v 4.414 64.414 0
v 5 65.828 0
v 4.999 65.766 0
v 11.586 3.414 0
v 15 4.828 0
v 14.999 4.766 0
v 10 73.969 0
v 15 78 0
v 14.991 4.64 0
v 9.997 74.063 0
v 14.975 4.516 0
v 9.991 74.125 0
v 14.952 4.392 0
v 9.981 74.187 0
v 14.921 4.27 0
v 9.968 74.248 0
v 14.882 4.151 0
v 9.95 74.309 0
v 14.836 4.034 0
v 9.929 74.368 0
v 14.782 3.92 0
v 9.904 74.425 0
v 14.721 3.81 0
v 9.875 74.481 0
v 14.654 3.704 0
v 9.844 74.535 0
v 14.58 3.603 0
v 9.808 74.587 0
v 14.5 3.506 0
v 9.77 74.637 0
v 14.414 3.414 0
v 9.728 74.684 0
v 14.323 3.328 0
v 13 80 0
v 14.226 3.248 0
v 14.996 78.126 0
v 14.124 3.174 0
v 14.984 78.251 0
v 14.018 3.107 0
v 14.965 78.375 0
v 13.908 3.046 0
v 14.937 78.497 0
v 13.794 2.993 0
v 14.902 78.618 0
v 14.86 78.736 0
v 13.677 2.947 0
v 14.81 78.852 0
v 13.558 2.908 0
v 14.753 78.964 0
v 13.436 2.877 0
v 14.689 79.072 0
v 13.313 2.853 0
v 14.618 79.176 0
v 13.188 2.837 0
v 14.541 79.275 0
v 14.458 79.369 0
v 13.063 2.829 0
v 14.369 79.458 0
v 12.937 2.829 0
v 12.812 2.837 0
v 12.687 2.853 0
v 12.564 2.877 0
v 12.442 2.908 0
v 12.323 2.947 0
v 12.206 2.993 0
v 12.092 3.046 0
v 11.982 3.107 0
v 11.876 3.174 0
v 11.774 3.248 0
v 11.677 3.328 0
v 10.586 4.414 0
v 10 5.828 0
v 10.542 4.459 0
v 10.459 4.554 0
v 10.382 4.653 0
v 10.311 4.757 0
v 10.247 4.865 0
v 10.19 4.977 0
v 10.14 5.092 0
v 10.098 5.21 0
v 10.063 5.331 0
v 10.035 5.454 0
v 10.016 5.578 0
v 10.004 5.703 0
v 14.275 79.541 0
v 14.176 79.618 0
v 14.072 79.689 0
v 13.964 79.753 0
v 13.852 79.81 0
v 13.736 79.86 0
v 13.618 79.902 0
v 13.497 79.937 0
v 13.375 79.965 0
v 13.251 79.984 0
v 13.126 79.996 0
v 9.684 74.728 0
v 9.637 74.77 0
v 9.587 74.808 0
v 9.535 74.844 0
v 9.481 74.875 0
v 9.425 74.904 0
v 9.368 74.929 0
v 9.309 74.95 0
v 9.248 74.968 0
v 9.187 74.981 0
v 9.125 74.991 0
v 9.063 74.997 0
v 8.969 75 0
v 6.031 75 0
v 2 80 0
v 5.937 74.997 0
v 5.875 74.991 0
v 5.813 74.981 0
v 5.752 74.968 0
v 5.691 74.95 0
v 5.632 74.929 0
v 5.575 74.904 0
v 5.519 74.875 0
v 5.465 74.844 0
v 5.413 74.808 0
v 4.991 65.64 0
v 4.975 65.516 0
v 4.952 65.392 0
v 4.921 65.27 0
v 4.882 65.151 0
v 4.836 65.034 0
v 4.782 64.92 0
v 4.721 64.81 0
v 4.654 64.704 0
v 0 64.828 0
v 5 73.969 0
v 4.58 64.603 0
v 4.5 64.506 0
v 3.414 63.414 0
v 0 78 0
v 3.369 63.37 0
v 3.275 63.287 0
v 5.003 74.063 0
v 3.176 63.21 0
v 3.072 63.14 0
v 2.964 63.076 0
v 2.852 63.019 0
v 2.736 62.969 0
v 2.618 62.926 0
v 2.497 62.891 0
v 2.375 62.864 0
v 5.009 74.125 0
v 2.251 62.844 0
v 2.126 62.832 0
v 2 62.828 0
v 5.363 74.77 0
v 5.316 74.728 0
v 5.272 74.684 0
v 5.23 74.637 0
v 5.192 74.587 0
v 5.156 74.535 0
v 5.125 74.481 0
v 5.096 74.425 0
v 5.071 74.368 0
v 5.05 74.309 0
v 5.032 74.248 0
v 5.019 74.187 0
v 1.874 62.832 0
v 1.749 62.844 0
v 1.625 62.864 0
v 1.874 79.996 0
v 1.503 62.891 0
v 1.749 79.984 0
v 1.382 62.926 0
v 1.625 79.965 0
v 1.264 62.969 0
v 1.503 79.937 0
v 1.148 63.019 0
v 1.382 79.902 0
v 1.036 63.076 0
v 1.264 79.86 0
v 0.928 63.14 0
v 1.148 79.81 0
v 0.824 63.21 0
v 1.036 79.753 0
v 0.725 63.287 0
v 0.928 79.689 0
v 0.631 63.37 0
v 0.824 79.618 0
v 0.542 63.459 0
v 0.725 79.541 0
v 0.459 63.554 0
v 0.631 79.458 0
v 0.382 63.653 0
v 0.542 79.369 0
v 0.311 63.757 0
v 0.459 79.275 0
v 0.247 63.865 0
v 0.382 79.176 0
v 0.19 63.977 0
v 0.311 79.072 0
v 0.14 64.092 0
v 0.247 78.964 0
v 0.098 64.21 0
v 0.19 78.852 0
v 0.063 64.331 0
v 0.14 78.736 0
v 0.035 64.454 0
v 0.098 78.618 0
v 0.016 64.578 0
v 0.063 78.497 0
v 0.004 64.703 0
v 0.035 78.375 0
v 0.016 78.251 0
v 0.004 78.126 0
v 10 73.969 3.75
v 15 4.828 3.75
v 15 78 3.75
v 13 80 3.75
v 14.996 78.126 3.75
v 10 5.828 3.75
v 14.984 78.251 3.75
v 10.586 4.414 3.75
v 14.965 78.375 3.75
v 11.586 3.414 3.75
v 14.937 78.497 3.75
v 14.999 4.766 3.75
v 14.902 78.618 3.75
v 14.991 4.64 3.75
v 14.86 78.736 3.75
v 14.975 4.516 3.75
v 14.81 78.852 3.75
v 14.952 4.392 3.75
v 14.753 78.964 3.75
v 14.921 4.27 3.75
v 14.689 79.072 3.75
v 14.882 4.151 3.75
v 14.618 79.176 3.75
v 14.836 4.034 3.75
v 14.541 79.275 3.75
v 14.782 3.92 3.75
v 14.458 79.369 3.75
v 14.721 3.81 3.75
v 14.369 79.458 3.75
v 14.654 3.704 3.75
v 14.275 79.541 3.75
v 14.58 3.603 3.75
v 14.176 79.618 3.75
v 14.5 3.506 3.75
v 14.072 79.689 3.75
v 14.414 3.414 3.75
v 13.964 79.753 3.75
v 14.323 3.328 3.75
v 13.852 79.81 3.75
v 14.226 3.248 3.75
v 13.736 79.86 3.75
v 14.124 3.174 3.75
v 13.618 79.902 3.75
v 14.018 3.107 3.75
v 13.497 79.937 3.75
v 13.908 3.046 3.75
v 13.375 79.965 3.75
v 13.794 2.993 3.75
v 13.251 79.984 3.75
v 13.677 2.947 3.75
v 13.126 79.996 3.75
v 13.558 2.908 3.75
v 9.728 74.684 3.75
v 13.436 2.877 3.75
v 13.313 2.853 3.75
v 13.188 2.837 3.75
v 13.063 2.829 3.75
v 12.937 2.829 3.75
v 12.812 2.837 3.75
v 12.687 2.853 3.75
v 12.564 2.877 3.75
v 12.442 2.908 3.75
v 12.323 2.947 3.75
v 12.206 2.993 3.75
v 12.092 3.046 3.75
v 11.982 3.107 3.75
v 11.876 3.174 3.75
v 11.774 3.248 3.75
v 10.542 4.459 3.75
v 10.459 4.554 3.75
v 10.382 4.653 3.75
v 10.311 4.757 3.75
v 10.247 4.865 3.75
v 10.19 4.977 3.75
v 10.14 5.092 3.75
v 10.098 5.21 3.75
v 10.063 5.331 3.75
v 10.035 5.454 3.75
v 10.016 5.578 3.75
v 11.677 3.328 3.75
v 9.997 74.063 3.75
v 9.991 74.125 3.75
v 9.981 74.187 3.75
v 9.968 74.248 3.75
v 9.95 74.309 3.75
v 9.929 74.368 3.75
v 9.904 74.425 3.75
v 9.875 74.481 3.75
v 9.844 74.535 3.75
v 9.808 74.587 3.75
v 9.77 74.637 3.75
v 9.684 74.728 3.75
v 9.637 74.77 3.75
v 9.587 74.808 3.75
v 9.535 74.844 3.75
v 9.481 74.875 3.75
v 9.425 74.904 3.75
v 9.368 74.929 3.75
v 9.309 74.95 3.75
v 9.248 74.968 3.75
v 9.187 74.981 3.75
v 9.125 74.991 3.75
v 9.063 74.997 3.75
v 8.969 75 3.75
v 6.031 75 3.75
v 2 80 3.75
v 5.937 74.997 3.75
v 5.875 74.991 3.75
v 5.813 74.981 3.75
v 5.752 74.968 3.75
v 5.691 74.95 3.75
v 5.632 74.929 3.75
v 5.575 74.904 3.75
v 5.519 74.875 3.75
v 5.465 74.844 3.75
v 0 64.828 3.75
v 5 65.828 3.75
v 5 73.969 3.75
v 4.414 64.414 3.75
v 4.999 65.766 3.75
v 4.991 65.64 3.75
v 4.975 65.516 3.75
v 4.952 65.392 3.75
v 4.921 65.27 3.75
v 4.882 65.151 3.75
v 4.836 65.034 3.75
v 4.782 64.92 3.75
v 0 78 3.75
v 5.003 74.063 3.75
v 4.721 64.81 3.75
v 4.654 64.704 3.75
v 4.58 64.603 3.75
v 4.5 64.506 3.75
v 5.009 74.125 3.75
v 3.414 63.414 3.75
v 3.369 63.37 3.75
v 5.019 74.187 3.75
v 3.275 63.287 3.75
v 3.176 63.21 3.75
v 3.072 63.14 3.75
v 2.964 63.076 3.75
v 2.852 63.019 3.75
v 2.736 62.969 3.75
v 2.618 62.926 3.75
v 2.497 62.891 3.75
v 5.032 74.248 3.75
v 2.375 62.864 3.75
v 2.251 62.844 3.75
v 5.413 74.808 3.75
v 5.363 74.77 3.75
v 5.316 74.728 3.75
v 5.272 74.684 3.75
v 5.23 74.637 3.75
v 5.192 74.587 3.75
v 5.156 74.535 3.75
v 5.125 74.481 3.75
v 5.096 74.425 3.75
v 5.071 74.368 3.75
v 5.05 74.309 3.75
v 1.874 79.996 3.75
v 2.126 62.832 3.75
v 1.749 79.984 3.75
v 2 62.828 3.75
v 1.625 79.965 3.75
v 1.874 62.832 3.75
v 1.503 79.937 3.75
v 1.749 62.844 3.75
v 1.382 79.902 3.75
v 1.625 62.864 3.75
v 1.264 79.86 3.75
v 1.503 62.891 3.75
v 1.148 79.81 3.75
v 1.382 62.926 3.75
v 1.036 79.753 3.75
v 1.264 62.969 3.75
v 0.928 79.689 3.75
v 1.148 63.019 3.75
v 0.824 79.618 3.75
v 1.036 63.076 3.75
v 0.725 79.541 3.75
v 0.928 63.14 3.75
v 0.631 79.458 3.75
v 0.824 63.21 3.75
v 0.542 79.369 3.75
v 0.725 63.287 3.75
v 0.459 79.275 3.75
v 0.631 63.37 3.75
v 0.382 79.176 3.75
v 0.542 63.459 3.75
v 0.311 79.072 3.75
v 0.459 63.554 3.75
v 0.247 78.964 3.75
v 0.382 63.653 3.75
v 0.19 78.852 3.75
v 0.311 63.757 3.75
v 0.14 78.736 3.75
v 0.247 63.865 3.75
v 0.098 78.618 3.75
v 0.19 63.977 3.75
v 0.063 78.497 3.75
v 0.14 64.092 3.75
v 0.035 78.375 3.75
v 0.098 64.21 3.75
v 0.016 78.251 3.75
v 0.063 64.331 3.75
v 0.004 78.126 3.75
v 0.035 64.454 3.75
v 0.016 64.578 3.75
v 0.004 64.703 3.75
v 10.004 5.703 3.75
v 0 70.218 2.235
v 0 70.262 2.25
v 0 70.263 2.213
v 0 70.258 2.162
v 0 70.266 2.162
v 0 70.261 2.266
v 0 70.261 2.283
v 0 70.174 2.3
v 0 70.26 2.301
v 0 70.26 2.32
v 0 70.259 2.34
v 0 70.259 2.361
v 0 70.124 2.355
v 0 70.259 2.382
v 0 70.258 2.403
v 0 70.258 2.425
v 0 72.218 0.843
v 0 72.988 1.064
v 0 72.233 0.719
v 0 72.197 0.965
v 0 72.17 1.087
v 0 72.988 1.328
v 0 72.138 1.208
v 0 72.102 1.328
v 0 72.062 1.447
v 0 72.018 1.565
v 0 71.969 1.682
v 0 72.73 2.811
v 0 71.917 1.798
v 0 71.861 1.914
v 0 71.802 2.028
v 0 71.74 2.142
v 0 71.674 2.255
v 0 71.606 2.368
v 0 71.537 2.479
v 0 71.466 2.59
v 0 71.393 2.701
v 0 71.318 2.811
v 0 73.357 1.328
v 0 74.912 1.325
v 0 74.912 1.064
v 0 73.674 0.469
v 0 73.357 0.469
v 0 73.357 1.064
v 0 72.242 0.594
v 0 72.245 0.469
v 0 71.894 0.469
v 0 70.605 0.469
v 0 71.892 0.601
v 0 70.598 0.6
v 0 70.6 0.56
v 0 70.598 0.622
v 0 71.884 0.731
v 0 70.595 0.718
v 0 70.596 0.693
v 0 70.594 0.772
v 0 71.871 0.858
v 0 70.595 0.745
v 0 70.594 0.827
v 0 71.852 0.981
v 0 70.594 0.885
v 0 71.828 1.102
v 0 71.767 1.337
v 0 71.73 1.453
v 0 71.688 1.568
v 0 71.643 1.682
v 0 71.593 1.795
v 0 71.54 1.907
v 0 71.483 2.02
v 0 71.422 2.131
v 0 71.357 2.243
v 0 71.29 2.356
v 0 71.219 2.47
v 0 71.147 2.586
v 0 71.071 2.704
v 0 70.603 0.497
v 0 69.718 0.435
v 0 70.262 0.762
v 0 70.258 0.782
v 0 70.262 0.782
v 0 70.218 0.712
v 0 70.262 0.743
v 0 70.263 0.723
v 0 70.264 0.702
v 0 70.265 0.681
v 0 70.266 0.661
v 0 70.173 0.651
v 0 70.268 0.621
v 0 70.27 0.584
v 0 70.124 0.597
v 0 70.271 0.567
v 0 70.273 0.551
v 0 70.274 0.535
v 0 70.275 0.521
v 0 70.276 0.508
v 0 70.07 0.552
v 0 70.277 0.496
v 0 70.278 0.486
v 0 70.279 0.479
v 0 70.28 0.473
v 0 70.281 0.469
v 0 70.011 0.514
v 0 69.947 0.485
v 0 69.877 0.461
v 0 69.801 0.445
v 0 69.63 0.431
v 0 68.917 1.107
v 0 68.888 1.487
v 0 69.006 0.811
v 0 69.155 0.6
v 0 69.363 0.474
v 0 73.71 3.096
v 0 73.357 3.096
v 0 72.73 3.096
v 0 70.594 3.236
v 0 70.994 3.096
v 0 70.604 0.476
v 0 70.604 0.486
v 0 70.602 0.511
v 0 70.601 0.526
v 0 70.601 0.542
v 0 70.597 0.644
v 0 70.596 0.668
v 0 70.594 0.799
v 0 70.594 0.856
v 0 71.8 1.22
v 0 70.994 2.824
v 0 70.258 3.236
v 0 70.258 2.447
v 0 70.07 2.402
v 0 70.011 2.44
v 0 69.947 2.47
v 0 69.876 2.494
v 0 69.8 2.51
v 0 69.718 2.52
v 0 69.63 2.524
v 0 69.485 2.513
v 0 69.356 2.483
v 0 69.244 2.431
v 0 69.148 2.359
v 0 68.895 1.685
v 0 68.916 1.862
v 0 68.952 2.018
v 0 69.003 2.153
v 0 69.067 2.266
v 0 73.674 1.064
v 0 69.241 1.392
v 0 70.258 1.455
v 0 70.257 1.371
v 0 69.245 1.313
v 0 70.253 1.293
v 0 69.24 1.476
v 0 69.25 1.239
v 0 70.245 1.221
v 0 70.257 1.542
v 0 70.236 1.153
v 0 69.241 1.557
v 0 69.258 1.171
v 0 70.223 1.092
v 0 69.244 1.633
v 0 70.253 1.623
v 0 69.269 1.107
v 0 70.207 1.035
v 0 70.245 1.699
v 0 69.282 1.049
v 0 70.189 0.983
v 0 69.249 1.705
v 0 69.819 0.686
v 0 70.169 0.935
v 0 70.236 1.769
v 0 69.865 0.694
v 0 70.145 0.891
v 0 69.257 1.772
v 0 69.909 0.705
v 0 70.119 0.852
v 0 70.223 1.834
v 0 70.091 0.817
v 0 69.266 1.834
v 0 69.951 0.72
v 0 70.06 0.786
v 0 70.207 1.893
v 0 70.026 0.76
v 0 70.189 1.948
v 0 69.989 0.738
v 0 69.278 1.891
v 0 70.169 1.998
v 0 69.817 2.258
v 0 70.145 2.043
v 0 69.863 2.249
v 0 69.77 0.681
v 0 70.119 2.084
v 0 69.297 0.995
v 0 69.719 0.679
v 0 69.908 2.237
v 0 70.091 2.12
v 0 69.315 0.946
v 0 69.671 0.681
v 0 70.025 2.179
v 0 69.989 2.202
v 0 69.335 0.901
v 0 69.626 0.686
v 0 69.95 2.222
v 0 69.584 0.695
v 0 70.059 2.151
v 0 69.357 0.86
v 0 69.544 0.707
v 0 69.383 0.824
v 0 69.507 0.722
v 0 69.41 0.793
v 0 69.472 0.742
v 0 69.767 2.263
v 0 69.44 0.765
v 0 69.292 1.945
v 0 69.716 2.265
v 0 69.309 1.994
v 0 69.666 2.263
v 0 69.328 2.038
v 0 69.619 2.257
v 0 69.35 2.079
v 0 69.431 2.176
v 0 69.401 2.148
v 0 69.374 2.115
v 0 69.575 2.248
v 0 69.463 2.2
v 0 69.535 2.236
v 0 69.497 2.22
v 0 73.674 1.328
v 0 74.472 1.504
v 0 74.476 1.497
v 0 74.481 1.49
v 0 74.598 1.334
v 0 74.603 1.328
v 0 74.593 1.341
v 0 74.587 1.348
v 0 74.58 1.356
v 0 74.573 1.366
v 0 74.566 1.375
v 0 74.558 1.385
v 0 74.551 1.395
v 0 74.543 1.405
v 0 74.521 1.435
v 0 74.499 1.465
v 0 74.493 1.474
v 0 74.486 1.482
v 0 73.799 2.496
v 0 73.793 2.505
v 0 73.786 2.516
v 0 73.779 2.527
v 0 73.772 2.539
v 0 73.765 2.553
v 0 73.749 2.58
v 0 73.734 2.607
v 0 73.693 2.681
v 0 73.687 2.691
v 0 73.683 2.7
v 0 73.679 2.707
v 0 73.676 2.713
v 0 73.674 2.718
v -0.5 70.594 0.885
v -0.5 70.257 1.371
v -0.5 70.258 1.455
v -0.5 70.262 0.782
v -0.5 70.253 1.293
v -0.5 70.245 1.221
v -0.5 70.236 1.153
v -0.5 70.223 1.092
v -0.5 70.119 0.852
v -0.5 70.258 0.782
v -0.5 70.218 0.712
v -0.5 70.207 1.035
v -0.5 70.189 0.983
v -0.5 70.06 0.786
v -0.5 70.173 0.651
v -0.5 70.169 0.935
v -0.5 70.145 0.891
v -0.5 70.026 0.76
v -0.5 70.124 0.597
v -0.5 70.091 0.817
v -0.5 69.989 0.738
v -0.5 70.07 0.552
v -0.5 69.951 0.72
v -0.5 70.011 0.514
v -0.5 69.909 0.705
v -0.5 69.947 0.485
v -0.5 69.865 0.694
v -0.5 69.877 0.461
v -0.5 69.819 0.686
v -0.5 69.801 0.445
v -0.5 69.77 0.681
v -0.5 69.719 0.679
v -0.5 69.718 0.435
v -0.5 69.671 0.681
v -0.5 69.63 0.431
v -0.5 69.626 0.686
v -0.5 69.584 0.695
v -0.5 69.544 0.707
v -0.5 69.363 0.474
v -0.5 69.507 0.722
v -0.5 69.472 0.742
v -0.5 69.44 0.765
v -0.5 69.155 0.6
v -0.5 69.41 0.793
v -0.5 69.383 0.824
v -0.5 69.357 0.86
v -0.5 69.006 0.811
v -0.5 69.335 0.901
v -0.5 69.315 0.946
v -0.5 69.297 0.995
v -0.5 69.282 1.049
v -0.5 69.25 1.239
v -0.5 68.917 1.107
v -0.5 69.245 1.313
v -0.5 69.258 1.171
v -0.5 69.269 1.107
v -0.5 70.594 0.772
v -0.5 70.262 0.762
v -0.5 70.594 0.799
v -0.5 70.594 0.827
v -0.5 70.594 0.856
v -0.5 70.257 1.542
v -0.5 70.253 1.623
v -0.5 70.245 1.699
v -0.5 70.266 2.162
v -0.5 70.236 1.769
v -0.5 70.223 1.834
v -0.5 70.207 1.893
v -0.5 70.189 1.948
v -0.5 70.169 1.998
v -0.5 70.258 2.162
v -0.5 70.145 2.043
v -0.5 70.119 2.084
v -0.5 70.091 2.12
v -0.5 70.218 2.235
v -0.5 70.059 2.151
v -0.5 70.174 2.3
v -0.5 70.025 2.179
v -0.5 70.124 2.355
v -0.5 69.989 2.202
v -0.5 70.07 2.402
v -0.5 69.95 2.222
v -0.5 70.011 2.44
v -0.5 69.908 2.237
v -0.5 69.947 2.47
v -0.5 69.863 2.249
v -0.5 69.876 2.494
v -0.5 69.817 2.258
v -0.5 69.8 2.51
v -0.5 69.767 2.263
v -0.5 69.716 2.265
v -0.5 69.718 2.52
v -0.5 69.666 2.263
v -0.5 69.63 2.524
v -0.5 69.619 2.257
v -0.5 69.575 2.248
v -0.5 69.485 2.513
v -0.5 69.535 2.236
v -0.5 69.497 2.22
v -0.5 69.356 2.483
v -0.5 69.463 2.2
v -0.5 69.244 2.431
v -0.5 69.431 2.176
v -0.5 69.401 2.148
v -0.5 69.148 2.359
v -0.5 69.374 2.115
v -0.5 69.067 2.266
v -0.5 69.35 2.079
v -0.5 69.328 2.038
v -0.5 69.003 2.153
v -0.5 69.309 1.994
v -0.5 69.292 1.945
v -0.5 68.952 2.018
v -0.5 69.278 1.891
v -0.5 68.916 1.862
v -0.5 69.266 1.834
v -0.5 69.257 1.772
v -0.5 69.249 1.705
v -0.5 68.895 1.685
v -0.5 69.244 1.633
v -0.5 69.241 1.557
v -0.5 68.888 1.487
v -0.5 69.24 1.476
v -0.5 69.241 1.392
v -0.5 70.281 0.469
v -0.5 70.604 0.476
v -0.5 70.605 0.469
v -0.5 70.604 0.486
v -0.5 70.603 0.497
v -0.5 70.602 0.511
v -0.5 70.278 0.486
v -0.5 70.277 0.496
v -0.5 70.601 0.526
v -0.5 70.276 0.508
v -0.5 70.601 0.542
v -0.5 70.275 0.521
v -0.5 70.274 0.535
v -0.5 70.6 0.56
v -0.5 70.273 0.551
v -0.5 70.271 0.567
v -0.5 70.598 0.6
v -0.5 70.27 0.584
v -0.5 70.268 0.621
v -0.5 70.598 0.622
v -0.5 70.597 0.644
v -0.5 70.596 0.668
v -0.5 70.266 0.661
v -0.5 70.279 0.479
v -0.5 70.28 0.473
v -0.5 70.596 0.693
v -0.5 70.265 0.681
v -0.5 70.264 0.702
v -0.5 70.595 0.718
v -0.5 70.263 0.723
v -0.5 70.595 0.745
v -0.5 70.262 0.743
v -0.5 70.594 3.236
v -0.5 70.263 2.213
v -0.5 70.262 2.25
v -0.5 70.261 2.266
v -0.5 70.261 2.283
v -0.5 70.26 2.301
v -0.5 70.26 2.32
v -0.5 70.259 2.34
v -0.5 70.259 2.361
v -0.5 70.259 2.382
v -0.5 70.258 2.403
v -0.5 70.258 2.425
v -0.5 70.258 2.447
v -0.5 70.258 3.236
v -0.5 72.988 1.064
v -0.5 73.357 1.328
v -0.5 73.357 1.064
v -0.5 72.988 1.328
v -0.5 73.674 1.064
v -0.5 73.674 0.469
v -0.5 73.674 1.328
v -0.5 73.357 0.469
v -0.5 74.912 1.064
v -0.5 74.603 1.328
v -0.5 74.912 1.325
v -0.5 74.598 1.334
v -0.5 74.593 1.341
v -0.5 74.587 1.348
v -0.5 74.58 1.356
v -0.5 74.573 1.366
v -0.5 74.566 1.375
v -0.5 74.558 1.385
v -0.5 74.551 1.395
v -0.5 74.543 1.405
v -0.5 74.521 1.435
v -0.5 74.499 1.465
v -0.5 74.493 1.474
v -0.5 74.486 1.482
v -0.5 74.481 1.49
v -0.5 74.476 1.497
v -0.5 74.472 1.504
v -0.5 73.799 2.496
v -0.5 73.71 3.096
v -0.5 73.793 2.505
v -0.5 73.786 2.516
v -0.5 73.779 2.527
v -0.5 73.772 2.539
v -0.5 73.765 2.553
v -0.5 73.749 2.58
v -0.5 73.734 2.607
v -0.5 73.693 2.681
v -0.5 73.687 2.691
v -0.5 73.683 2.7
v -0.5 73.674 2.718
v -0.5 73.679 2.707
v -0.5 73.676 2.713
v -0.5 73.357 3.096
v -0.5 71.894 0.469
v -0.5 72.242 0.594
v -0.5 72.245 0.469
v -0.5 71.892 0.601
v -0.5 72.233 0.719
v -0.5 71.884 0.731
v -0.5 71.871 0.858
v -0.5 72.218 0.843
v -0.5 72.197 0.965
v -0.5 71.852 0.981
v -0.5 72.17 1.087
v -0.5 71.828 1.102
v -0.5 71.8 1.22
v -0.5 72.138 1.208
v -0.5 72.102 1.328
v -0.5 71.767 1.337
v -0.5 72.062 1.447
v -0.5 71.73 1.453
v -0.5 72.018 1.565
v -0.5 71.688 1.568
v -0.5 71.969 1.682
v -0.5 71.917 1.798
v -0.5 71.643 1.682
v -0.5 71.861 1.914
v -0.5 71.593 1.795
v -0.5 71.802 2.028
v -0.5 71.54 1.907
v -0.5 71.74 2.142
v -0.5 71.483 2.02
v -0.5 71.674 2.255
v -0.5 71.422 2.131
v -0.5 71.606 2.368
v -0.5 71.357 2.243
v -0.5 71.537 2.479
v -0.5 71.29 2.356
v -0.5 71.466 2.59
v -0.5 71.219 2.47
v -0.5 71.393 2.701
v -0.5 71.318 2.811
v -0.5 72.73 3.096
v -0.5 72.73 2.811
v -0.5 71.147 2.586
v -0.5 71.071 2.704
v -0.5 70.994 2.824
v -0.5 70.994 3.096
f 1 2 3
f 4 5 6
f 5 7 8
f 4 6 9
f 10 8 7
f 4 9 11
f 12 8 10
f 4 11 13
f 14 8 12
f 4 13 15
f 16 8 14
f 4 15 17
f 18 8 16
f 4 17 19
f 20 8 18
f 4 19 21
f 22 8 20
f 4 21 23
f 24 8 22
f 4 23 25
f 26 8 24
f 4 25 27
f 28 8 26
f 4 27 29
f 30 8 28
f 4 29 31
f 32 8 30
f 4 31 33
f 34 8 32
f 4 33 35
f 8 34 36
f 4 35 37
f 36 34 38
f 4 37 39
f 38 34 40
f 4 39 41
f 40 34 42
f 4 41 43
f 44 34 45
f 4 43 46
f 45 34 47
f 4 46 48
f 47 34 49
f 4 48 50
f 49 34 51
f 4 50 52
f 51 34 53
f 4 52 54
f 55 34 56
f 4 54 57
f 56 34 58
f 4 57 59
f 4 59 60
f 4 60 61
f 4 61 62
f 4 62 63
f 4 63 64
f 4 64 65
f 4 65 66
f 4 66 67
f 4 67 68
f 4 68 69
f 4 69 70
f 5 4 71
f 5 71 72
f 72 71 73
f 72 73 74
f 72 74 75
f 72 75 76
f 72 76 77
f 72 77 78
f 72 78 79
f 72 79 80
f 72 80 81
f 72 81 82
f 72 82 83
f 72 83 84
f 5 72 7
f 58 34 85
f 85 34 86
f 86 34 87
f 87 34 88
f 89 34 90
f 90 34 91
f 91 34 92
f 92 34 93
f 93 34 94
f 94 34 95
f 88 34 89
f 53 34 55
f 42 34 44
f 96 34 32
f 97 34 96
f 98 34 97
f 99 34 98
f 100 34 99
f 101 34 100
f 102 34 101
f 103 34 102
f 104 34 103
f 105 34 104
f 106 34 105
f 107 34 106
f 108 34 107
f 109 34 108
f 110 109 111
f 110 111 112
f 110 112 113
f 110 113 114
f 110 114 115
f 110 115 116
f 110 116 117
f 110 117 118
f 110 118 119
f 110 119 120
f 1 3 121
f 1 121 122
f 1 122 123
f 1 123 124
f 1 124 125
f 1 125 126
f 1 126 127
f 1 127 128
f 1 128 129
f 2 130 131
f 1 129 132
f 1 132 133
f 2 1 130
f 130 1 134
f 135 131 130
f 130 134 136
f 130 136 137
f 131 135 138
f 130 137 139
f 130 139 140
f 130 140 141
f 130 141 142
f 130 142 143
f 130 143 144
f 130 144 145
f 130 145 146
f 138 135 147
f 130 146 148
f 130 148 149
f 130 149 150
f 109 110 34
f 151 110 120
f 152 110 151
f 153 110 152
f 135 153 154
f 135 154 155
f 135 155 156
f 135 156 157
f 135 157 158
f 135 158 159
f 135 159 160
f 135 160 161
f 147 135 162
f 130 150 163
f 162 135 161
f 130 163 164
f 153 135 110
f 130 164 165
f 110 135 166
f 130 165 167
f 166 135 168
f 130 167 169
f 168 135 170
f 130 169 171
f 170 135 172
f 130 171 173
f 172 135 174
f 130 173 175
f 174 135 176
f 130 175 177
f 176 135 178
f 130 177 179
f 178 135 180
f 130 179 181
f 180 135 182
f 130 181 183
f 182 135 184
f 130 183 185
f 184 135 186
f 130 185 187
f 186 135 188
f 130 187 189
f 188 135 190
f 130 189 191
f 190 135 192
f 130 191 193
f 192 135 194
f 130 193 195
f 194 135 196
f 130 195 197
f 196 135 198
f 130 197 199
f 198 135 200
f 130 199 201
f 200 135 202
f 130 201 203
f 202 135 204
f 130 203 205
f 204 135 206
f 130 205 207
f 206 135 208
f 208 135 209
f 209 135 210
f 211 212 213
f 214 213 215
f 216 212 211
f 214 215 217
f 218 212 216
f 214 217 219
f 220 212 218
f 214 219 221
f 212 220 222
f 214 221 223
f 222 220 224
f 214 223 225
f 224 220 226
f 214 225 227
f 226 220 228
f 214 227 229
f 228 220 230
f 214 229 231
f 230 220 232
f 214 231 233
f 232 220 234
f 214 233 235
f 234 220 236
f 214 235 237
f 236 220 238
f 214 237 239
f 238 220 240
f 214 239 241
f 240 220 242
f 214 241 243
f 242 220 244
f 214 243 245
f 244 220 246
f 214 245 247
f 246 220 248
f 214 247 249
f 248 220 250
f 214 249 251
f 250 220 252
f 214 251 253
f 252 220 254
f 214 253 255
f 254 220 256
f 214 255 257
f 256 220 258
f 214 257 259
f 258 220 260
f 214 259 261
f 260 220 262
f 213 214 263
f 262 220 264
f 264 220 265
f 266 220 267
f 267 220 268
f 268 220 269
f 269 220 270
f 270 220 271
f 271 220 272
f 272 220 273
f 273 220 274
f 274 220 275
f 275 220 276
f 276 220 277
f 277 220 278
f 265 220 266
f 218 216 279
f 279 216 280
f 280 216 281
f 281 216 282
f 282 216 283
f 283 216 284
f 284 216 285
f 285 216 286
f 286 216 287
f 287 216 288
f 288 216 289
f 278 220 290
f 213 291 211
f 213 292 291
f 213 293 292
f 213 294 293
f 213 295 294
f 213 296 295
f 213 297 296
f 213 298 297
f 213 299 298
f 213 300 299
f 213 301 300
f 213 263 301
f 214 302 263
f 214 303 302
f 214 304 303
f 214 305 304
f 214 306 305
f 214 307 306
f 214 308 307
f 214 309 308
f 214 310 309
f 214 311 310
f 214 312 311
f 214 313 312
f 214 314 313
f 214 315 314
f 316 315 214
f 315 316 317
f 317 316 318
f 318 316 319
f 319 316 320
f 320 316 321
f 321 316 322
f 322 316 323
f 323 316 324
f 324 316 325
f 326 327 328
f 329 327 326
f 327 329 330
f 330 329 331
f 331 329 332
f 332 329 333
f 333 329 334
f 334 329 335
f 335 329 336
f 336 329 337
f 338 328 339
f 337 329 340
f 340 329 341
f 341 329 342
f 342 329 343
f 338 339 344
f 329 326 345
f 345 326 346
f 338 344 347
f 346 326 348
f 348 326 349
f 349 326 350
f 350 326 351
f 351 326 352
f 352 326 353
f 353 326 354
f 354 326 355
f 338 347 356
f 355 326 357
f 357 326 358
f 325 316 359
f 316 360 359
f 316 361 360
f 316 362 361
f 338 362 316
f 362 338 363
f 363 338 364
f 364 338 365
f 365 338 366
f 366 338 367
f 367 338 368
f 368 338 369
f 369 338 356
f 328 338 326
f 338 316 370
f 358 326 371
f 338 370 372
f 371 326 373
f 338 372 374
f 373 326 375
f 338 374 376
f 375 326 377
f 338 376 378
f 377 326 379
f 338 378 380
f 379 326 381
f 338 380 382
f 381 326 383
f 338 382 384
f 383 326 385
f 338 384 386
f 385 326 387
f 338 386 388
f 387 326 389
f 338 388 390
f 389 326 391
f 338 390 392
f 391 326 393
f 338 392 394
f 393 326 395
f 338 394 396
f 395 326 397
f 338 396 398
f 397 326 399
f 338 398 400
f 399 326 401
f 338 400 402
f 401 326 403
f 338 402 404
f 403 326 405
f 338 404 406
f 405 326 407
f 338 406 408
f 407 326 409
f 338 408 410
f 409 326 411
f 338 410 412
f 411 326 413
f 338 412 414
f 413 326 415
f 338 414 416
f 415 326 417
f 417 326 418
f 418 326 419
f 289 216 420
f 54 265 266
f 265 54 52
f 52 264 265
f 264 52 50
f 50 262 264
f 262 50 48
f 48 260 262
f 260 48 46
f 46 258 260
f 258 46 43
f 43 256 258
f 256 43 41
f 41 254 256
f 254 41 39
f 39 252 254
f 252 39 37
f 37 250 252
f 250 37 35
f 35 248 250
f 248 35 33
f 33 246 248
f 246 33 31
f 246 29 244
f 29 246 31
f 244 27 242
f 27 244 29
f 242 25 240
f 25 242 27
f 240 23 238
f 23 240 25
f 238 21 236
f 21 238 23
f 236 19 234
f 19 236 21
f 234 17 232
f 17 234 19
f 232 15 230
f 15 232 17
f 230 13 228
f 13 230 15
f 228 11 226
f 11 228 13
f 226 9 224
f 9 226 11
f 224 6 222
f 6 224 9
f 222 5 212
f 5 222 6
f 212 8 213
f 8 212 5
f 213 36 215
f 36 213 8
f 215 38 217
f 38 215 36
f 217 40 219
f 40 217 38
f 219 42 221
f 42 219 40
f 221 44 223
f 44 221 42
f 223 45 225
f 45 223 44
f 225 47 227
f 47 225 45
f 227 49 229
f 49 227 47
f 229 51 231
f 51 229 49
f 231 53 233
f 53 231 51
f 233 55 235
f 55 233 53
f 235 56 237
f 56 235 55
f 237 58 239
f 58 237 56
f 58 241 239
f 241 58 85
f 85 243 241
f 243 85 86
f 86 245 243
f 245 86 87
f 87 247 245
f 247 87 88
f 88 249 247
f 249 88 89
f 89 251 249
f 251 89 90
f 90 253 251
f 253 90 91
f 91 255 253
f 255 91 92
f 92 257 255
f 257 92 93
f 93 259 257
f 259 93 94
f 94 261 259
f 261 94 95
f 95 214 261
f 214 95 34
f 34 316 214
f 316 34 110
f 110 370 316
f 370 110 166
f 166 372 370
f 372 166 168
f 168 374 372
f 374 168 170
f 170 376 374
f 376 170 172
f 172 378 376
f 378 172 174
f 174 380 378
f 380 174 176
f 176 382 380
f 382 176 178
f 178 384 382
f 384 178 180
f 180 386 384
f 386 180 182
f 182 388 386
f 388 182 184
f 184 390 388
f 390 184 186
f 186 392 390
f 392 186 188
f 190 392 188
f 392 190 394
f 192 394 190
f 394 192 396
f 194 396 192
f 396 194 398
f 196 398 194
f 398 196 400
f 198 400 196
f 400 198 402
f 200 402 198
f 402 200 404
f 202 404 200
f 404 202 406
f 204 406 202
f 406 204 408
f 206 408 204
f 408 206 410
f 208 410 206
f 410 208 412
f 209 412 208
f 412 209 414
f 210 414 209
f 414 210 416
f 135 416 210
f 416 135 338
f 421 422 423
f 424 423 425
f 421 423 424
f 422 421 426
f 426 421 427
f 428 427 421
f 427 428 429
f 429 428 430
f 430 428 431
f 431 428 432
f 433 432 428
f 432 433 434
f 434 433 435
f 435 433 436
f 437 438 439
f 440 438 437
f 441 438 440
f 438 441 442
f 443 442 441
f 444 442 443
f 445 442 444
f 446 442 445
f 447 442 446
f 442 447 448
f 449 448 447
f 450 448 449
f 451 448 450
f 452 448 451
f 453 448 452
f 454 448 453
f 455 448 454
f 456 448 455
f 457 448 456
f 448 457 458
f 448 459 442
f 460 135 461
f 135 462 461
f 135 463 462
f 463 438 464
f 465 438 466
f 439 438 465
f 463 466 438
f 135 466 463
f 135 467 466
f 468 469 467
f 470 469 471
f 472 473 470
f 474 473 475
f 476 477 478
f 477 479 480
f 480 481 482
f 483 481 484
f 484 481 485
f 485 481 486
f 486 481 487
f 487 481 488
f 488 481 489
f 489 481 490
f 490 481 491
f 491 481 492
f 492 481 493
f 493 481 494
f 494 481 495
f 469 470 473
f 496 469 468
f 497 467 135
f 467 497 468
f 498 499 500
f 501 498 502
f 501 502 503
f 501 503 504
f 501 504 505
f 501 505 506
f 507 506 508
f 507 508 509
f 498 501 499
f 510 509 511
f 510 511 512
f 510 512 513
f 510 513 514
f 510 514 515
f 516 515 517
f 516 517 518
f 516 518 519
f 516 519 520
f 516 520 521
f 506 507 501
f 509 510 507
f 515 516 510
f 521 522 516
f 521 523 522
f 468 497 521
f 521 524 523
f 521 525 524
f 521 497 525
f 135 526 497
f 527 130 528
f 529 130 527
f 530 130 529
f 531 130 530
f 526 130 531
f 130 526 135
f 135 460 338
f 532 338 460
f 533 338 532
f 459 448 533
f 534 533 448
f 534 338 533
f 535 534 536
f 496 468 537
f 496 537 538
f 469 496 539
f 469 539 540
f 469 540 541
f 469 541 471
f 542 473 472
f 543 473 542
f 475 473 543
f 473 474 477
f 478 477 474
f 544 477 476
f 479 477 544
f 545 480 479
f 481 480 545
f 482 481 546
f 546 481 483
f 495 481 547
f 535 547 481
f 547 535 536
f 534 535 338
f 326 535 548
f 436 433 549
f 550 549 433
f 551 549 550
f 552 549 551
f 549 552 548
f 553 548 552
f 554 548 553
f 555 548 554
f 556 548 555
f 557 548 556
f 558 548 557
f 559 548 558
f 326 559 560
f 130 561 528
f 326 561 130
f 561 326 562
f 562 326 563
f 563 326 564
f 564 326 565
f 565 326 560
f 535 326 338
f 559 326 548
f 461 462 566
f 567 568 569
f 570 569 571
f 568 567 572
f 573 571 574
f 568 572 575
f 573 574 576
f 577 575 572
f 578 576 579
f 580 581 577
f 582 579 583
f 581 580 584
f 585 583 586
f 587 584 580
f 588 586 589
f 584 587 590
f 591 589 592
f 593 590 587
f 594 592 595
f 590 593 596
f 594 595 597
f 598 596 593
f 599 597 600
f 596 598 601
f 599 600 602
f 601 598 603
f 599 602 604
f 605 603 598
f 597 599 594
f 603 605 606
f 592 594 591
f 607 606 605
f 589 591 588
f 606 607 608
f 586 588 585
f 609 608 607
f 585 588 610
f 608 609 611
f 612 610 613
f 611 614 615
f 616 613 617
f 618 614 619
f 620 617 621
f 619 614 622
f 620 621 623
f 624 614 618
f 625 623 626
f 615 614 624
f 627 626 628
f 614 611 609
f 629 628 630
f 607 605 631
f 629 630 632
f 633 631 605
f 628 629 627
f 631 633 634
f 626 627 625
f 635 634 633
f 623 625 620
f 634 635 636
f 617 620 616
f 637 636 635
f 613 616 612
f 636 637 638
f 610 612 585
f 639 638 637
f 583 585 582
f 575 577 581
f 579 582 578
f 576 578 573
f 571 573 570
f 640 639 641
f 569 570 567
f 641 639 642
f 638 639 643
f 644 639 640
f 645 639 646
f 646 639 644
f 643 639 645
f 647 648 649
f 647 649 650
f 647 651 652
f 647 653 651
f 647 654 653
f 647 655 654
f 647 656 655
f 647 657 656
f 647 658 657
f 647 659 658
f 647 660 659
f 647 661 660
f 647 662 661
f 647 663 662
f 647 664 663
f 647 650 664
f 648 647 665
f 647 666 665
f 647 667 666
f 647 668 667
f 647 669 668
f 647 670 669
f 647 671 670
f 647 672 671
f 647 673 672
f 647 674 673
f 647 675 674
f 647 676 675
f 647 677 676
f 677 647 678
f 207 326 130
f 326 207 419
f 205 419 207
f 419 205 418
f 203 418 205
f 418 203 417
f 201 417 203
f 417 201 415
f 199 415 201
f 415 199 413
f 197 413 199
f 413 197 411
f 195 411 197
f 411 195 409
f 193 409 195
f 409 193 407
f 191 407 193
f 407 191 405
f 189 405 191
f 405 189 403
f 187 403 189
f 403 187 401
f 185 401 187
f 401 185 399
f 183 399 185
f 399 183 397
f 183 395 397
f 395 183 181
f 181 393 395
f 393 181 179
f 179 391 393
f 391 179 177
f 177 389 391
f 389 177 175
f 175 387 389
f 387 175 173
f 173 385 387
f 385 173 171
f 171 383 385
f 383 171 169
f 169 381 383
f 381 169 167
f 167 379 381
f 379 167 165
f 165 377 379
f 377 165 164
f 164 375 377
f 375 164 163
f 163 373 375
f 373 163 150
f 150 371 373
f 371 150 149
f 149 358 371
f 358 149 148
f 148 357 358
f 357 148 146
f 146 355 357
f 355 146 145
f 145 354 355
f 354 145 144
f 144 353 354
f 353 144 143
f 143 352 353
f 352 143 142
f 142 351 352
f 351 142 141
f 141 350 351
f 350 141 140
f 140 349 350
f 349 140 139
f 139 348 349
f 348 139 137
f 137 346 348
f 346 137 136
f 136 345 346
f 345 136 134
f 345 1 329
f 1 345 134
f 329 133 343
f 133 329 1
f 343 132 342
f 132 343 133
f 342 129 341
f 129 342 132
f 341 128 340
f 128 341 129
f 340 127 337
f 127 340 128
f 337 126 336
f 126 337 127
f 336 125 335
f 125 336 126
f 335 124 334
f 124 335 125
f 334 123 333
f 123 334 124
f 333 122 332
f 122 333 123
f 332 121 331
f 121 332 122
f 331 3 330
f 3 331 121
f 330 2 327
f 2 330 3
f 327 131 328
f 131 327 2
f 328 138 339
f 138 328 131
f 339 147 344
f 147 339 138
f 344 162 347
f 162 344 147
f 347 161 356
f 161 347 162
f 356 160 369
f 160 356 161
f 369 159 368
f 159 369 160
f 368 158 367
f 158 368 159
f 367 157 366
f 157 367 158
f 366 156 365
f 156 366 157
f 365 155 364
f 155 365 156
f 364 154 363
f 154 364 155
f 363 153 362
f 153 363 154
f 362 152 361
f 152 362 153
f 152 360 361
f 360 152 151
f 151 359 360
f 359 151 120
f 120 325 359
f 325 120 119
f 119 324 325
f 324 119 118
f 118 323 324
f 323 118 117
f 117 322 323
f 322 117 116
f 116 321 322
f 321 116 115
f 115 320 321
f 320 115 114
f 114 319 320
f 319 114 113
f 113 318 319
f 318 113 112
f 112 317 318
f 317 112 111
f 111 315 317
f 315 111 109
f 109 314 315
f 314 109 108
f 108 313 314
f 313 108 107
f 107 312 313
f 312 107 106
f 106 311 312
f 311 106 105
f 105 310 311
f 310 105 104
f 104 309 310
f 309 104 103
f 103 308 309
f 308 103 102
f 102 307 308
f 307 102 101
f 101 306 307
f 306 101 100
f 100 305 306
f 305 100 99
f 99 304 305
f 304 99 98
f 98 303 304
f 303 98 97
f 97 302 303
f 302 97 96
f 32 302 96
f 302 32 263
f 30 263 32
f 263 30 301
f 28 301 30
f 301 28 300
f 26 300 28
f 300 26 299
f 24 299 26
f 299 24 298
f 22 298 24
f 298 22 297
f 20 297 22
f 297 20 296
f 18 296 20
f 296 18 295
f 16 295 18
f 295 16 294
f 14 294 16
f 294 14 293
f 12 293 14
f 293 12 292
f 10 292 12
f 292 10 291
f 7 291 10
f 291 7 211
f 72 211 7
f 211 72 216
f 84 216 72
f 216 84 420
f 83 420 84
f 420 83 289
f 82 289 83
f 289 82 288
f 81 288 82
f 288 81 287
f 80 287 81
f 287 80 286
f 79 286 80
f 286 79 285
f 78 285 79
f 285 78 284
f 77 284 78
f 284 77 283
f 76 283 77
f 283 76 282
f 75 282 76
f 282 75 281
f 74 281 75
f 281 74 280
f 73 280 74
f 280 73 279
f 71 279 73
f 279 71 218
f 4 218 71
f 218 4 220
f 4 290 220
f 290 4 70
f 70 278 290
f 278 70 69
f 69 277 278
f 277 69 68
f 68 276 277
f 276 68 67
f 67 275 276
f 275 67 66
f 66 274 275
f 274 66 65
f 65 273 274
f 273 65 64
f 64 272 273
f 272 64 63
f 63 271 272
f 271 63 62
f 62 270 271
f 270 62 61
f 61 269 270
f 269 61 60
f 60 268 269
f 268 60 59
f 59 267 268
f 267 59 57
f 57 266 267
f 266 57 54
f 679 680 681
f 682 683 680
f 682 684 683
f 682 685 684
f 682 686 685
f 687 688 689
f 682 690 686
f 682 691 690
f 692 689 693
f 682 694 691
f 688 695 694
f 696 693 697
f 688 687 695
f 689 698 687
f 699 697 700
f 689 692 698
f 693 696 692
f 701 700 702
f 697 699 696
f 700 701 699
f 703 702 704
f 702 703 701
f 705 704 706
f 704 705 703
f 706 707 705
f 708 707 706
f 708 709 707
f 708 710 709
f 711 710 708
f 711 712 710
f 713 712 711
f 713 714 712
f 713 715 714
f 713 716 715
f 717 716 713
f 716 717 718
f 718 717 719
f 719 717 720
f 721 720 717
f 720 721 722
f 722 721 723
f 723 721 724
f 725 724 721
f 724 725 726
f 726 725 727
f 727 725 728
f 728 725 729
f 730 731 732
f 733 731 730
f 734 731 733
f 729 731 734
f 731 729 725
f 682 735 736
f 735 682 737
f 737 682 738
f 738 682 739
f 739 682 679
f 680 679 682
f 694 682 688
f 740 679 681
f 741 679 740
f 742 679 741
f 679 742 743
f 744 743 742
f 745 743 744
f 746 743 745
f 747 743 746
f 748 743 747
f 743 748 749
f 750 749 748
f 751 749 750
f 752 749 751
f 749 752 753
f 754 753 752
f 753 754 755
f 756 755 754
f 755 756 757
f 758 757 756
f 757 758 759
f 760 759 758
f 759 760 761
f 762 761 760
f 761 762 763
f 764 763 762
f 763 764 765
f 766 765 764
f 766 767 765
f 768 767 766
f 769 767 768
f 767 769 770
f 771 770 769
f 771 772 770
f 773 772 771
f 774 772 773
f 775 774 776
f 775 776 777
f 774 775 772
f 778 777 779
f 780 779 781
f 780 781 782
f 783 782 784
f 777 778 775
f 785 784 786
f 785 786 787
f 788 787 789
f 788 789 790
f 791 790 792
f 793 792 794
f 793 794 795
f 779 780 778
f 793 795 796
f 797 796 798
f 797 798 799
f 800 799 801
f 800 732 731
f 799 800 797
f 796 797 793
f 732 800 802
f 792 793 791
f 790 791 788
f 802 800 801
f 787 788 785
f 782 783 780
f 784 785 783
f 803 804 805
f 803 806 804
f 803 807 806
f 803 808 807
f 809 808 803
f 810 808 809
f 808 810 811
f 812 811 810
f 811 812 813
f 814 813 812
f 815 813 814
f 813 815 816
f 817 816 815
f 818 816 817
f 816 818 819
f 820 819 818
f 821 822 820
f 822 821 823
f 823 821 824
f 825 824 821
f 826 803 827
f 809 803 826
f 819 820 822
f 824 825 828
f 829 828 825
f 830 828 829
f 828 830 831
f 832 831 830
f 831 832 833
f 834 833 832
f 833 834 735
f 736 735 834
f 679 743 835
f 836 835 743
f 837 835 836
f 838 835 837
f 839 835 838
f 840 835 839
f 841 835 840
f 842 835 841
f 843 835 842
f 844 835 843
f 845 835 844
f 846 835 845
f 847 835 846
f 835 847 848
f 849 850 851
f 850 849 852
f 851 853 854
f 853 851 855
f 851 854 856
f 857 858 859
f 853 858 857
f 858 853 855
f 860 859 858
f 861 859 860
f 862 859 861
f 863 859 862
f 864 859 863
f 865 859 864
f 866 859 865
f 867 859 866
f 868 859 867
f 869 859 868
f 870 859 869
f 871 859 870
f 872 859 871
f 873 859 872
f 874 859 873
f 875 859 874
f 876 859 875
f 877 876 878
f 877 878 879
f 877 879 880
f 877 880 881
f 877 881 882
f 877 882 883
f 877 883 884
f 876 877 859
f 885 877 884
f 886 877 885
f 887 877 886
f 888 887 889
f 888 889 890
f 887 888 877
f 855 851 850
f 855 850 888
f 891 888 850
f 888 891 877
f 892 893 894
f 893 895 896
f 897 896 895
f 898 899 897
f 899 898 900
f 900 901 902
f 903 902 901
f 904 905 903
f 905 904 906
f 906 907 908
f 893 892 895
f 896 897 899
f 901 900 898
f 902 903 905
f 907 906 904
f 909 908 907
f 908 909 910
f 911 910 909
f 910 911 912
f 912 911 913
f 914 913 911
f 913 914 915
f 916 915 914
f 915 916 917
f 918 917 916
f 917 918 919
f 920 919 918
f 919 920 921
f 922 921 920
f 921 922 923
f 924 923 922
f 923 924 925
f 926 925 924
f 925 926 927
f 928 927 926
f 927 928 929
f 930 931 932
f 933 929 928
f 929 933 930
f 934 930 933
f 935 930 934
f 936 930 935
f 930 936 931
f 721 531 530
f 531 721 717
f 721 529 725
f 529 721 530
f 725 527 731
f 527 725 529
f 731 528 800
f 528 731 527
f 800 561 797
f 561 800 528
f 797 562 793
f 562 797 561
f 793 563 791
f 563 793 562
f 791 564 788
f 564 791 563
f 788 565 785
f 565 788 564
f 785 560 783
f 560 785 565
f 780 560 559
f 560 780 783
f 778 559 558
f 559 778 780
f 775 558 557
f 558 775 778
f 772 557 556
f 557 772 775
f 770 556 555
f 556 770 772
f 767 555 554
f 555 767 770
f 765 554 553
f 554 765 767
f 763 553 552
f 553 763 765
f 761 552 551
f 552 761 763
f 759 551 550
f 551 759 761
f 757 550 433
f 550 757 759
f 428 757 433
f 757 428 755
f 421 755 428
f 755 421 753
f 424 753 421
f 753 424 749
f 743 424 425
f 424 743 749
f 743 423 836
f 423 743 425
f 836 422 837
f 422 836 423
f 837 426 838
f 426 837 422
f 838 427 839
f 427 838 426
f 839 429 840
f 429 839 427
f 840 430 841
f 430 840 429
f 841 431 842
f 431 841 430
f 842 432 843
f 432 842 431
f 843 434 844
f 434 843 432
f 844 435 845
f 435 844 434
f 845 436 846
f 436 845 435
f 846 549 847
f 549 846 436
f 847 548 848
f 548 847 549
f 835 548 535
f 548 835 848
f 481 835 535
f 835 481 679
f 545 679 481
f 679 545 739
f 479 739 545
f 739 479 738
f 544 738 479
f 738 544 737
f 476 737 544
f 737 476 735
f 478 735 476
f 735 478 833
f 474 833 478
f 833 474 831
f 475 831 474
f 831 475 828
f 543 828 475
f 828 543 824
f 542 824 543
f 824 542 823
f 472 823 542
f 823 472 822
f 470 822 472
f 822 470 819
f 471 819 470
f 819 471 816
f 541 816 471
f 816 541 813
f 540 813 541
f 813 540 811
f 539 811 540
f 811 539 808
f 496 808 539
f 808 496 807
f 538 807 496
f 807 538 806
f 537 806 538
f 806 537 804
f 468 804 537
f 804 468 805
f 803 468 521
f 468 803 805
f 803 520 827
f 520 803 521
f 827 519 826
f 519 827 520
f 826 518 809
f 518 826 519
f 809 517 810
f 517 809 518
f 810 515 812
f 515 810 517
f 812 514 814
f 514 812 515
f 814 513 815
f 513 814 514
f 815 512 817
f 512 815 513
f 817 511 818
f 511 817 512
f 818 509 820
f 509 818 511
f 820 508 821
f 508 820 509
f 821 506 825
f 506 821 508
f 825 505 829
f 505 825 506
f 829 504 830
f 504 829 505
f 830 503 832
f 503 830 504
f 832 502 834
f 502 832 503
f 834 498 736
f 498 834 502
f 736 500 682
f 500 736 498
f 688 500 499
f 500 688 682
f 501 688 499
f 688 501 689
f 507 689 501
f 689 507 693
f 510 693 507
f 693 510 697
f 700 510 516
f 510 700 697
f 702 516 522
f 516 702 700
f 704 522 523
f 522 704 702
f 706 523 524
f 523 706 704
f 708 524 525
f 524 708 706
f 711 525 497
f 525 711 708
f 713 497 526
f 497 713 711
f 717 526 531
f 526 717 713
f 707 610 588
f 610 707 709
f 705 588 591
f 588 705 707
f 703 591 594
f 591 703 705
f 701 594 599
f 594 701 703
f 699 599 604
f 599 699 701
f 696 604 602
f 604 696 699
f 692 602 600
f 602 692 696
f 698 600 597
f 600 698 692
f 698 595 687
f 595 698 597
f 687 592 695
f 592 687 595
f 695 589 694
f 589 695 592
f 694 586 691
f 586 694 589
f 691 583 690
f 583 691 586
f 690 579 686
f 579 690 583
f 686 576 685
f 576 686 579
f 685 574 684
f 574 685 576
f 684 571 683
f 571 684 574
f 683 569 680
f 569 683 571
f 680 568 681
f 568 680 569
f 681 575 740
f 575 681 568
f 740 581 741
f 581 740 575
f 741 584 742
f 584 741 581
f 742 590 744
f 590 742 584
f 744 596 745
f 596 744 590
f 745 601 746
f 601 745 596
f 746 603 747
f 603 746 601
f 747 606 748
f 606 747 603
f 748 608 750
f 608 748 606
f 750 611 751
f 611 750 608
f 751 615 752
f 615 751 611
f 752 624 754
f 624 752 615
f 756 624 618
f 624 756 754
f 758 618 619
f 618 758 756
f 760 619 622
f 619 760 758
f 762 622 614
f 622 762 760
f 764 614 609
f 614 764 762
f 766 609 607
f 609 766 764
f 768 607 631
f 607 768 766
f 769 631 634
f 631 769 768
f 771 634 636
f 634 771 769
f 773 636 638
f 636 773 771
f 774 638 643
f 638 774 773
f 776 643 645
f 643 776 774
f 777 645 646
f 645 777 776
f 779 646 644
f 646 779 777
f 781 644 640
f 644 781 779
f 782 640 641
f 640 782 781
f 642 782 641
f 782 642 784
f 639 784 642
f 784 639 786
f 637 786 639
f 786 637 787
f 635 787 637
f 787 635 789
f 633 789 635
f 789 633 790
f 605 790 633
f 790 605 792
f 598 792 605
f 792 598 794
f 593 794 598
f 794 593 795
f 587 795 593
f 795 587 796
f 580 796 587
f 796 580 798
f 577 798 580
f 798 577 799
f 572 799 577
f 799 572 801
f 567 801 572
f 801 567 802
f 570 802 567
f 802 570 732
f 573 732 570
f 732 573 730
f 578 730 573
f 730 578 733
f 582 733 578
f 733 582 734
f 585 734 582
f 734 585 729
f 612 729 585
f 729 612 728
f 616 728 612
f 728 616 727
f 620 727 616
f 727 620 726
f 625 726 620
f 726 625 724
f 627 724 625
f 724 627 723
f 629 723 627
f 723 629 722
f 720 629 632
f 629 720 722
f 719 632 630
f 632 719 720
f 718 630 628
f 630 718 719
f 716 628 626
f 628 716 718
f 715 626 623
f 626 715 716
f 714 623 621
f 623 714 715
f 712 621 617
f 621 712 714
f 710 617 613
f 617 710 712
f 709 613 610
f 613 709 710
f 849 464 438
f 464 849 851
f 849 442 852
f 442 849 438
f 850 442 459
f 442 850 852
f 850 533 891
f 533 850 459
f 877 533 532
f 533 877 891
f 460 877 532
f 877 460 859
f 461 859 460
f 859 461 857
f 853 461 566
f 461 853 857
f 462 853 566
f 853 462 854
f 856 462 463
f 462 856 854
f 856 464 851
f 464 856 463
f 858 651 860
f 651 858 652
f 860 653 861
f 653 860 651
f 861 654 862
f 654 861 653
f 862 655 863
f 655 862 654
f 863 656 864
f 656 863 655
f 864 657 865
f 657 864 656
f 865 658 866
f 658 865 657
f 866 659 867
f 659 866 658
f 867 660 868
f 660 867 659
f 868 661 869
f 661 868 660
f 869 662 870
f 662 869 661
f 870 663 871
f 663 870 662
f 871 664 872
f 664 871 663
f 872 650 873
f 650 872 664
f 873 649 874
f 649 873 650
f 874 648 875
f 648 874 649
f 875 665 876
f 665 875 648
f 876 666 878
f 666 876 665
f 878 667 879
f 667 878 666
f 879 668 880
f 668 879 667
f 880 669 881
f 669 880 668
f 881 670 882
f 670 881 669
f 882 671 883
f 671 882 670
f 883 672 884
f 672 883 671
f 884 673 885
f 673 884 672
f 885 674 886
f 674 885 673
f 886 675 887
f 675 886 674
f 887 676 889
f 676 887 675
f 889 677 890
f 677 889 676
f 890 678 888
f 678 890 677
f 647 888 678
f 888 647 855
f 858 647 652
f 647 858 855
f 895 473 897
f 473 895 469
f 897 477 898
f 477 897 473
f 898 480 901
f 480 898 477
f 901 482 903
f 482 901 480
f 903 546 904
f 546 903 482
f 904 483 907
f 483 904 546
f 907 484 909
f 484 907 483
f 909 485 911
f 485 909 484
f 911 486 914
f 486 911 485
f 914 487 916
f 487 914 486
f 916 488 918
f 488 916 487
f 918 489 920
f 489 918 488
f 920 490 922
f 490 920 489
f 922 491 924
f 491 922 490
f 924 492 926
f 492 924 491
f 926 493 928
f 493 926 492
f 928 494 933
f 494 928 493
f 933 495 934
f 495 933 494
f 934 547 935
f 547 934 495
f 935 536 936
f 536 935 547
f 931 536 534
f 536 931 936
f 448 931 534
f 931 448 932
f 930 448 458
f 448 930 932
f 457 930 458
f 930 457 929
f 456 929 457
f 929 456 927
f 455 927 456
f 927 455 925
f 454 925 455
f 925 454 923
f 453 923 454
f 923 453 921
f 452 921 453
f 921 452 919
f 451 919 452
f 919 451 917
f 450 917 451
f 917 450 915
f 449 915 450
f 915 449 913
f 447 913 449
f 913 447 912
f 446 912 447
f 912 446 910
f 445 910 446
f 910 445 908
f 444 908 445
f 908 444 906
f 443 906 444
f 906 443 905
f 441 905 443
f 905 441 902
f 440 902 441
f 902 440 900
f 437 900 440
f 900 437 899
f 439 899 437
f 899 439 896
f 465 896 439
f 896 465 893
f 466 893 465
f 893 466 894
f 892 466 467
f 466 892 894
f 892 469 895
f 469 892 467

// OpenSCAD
// Hook to be attached a part of a tray or other
// Skadis item for fixing it to the board 

use <../Round-Anything/polyround.scad>;

// length:  in mm, how long the hook is, minimum should be 40, divisible by 5
// width: in mm, how wide the hook is, adjust for compatibilty with slots in rings etc

module boxhook(length=80,width=3.75) {
  unit = 5;

  template = [
      [3,0], [3, (length/unit)], [0, (length/unit)], [0, (length/unit)-4],
      [1,(length/unit)-3], [1,(length/unit)-1], [2,(length/unit)-1],
      [2,1], [3,0]
  ];

  $fn=36; // remove for dev

  linear_extrude(width) {
      round2d(2,1) polygon(template * unit);
  };

  echo (template);

  translate([0, length - unit, width * 0.125]) {
    rotate([90, 0, 270]) {
      linear_extrude(0.5) {
          text("47b", width - 1);
      }
    }
  }
}

boxhook();
